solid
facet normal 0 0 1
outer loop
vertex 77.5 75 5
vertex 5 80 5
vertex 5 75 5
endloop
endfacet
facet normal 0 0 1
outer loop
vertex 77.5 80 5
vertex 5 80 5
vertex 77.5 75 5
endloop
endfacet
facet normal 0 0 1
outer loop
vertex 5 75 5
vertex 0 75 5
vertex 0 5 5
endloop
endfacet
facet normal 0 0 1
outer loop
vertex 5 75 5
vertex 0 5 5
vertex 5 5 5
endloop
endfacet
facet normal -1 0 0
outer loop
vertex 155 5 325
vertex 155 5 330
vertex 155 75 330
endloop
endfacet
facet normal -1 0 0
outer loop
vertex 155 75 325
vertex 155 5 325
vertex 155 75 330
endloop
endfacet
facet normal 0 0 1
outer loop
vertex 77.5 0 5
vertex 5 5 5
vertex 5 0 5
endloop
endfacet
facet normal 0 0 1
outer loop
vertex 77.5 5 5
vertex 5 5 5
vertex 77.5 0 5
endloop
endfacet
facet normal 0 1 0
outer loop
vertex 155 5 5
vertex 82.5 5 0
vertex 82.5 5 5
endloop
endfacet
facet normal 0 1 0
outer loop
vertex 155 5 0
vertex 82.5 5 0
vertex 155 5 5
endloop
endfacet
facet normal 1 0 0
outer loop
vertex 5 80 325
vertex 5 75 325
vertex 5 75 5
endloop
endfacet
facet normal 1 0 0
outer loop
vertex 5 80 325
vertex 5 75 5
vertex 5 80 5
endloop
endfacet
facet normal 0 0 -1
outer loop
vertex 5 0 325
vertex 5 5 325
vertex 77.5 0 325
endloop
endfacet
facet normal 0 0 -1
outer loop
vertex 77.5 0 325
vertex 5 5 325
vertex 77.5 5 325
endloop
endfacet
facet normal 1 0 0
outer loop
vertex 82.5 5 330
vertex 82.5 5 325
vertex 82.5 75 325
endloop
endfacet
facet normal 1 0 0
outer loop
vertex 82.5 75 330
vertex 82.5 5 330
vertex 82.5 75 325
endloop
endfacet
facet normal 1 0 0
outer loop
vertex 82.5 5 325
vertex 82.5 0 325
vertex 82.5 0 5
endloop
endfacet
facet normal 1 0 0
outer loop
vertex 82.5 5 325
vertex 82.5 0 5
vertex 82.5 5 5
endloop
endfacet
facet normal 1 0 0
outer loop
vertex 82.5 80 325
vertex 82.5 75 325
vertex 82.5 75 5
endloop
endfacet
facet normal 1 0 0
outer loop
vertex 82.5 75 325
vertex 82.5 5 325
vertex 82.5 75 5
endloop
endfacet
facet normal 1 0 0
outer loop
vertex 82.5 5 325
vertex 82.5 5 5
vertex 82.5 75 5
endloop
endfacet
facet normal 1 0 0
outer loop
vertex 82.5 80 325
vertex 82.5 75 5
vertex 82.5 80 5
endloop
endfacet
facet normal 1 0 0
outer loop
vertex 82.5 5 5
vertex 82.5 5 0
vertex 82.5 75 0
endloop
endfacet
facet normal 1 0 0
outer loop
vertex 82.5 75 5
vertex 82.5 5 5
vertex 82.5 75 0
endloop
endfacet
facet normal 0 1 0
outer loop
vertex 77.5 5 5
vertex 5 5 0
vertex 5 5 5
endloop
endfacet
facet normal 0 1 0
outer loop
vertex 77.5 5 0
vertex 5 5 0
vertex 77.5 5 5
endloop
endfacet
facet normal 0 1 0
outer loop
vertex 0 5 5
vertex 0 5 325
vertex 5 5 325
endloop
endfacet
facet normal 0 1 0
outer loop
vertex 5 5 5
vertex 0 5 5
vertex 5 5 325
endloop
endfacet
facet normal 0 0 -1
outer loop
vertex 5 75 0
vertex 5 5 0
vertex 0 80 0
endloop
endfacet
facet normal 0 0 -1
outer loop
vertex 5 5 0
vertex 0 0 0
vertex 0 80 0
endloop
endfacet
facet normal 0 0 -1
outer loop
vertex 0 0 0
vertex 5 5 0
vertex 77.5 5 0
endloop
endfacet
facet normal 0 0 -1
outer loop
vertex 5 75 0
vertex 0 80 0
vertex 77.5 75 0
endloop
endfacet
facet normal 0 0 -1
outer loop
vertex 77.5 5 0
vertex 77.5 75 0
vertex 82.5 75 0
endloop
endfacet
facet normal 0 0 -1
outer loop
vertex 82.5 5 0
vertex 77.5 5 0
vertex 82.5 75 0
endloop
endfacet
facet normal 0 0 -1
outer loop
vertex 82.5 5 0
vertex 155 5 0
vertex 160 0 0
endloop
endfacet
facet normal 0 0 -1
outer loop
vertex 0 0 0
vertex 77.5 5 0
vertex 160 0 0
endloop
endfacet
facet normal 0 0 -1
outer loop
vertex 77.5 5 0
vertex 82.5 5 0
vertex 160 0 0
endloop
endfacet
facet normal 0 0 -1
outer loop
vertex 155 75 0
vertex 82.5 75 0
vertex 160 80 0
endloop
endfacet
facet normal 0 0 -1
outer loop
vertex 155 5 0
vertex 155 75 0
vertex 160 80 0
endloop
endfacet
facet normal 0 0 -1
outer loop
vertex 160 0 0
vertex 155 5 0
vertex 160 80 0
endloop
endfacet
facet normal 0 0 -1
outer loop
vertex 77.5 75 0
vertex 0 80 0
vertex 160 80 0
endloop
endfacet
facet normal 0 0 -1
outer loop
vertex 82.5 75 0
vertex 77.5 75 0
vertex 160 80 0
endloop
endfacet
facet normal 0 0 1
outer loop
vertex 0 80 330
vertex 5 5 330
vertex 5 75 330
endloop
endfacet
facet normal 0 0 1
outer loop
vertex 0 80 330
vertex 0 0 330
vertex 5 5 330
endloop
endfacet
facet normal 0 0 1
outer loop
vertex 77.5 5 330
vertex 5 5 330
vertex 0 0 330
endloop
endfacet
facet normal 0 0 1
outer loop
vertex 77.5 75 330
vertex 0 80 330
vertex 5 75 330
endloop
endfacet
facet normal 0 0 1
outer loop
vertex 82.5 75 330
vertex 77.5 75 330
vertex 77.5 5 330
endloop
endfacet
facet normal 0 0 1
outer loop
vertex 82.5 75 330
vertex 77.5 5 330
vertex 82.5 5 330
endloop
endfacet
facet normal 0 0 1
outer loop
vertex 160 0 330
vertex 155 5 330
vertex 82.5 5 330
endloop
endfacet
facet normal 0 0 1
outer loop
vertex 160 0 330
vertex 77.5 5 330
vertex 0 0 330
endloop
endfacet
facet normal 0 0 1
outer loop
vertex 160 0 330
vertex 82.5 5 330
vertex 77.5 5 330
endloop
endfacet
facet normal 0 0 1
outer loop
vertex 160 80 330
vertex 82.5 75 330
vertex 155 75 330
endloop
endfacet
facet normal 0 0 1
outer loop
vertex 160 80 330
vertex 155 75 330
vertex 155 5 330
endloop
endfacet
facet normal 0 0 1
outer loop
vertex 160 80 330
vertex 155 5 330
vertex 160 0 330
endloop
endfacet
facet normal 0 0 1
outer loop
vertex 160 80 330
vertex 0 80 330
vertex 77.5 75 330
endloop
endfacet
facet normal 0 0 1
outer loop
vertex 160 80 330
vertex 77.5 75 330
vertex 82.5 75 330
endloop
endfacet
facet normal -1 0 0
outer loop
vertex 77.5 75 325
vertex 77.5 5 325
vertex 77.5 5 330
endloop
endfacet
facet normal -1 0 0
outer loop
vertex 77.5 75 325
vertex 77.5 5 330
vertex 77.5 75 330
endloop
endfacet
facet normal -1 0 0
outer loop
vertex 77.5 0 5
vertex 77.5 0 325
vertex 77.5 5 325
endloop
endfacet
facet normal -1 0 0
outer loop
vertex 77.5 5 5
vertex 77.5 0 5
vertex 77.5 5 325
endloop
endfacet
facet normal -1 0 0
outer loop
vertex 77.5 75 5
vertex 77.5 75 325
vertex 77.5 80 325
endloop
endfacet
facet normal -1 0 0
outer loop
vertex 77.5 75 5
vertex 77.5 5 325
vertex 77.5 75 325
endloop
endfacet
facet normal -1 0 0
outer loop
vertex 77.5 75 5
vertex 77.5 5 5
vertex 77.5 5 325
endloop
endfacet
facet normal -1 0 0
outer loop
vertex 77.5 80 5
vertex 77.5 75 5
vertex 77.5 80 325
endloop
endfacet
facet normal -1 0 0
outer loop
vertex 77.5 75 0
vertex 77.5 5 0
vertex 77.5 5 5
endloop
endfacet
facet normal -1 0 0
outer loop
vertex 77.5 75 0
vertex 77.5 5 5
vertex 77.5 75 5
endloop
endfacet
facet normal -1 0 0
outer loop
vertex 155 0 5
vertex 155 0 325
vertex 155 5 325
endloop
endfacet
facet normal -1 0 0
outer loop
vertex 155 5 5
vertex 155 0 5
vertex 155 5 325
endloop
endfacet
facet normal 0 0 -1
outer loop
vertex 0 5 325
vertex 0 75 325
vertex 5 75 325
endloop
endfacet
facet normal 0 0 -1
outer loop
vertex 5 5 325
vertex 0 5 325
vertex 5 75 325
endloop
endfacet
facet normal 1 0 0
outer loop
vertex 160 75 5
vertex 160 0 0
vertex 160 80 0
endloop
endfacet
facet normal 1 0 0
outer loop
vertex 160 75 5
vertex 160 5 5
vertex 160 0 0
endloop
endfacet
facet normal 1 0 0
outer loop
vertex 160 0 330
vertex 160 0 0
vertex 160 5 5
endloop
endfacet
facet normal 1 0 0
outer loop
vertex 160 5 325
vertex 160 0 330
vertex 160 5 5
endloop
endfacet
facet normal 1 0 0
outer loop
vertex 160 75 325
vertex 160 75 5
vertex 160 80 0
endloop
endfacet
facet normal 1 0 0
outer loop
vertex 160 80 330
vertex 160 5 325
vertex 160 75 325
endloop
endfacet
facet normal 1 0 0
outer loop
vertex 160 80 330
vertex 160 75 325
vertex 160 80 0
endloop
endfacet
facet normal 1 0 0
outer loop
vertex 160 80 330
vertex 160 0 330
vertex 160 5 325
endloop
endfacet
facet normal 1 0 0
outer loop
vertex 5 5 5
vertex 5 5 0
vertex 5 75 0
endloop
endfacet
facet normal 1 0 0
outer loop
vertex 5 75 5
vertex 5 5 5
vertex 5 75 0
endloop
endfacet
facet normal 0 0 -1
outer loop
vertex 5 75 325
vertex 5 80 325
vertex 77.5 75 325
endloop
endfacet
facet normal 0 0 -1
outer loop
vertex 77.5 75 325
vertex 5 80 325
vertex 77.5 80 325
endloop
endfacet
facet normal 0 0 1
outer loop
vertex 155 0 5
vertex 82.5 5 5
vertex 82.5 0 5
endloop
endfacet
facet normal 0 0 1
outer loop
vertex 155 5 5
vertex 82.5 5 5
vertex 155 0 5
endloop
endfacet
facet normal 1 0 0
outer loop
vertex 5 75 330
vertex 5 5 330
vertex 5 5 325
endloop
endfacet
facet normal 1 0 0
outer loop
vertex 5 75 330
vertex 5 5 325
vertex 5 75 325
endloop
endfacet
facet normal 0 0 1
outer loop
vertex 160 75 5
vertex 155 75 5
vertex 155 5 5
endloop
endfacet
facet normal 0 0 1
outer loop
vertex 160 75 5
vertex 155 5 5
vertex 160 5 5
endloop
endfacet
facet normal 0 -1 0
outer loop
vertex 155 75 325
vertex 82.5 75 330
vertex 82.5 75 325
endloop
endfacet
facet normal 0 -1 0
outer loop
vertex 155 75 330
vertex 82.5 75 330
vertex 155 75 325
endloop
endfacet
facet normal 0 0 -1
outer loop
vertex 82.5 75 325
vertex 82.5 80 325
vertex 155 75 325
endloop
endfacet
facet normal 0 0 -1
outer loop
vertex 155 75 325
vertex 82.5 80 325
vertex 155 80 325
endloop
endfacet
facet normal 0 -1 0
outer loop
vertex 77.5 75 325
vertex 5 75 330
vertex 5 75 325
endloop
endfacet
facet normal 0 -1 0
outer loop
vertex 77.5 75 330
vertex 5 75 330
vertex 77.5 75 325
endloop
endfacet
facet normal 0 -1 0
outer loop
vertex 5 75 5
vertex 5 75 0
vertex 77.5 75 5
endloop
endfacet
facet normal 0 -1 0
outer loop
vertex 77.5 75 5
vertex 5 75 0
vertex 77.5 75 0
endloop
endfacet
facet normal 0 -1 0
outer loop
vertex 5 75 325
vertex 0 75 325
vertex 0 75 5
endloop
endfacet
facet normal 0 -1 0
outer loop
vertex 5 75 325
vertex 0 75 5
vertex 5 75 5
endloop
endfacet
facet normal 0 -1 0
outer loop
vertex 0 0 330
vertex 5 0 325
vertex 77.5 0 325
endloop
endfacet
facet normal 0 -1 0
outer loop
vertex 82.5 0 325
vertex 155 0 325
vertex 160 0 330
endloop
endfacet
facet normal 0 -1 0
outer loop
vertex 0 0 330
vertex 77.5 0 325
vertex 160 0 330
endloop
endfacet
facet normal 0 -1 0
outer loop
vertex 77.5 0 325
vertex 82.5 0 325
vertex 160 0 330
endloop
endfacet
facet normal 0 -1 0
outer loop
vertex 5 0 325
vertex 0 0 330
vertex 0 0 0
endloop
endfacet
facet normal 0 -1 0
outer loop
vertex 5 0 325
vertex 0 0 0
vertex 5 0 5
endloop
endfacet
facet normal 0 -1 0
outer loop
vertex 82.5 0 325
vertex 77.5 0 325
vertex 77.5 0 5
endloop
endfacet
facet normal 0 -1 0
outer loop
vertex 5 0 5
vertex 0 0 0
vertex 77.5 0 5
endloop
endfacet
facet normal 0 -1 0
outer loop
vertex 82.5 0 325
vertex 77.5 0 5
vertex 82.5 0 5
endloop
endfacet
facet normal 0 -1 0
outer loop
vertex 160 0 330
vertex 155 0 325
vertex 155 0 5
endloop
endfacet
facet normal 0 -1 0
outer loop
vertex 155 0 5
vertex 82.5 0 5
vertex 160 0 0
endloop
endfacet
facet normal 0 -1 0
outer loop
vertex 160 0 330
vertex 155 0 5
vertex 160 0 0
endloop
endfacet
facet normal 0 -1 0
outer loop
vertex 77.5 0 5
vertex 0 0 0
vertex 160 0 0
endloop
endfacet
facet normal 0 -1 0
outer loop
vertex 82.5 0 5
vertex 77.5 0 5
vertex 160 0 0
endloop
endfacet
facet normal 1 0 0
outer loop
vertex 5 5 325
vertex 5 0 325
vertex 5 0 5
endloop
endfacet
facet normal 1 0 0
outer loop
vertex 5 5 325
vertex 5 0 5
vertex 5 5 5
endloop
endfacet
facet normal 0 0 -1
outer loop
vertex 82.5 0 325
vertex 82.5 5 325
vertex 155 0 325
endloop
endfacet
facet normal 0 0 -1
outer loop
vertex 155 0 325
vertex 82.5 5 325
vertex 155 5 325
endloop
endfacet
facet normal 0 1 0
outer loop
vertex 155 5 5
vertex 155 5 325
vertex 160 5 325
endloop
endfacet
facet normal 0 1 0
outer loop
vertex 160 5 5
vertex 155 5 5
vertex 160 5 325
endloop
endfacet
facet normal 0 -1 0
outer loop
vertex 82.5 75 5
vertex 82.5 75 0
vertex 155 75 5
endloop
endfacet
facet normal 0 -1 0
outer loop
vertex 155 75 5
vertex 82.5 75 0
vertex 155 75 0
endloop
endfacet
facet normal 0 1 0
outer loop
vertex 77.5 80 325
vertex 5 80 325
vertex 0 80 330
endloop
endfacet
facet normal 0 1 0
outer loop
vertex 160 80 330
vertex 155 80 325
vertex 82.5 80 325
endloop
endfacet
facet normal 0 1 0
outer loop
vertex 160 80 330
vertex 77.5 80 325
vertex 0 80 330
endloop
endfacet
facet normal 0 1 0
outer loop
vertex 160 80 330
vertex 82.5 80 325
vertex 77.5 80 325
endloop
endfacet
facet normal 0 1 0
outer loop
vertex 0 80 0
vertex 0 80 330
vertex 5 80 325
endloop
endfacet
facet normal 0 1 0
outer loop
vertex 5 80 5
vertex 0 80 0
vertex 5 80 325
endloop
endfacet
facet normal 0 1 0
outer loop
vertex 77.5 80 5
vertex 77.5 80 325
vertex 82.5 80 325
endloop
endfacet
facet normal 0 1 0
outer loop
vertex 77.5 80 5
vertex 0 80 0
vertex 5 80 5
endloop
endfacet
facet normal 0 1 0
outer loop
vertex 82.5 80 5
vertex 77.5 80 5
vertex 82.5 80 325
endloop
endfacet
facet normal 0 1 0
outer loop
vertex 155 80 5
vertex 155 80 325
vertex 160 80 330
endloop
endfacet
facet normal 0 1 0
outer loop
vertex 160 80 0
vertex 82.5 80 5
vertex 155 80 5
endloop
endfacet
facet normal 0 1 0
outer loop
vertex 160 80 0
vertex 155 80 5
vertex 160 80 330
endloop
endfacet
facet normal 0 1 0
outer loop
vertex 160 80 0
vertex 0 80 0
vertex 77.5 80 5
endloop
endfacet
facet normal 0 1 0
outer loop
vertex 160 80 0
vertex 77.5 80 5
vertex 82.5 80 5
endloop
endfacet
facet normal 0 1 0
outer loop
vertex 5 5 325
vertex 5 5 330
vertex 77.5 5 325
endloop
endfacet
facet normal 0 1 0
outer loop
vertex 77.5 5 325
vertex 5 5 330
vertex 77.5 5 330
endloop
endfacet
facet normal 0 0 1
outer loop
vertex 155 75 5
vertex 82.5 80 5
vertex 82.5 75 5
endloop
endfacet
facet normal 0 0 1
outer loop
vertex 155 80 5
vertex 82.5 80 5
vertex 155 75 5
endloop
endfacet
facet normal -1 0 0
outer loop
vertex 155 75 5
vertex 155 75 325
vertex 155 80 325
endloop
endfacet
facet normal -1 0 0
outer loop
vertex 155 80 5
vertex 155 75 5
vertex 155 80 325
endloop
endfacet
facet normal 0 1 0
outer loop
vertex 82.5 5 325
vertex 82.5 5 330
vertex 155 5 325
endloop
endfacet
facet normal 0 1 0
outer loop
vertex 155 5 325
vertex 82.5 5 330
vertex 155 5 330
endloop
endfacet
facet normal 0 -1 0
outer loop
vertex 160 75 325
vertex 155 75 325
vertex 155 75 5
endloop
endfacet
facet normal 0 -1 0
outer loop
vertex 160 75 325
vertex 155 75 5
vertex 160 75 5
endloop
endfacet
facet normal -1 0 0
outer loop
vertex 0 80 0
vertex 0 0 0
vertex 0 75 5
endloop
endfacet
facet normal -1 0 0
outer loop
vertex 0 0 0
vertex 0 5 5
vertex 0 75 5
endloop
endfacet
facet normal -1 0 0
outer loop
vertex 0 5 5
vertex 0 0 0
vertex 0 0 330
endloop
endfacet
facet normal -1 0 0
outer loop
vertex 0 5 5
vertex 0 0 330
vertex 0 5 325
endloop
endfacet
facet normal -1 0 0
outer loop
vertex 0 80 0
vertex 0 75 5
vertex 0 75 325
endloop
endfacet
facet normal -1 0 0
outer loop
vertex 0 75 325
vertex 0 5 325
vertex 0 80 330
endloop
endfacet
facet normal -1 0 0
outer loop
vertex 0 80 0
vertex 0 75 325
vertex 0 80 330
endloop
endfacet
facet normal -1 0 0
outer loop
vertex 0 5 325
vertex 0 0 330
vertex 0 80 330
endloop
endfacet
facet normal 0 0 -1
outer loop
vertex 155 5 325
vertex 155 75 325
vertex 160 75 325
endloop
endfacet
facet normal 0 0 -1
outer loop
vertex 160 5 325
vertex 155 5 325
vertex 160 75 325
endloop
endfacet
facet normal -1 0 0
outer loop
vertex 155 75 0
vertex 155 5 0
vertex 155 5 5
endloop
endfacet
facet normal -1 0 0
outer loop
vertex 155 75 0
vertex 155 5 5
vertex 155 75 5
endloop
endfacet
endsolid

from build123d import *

# Parameters (mm, degrees)
SKETCH3_W           = 160
SKETCH3_H           = 80
SKETCH3_W_2         = 150
SKETCH3_H_2         = 70
BOSS_EXTRUDE2_DEPTH = 5
SKETCH4_W           = 5
SKETCH4_H           = 5
BOSS_EXTRUDE3_DEPTH = 320
BOSS_EXTRUDE4_REACH = 327
SKETCH5_W           = 5
SKETCH5_H           = 80


with BuildPart() as part:
    # Sketch3 → Boss-Extrude2 (new body)
    with BuildSketch(Plane.XY):
        with Locations((80, 40)):
            Rectangle(SKETCH3_W, SKETCH3_H)
        with Locations((80, 40)):
            Rectangle(SKETCH3_W_2, SKETCH3_H_2, mode=Mode.SUBTRACT)
        Polygon((77.5, 75), (77.5, 41.649156988), (77.5, 5), (82.5, 5), (82.5, 41.649156988), (82.5, 75), align=None)
    boss_extrude2 = extrude(amount=BOSS_EXTRUDE2_DEPTH)

    # Sketch4 → Boss-Extrude3 (add)
    with BuildSketch(Plane.XY.offset(5)):
        with Locations((2.5, 2.5)):
            Rectangle(SKETCH4_W, SKETCH4_H)
        with Locations((2.5, 77.5)):
            Rectangle(SKETCH4_W, SKETCH4_H)
        with Locations((157.5, 77.5)):
            Rectangle(SKETCH4_W, SKETCH4_H)
        with Locations((157.5, 2.5)):
            Rectangle(SKETCH4_W, SKETCH4_H)
    extrude(amount=BOSS_EXTRUDE3_DEPTH)

    # Mirror1: Boss-Extrude2 across plane
    add(boss_extrude2.mirror(Plane.XY.offset(165)))

    # Sketch5 → Boss-Extrude4 (add, up to next)
    with BuildSketch(Plane.XY.offset(5), mode=Mode.PRIVATE) as boss_extrude4_sk1:
        with Locations((80, 40)):
            Rectangle(SKETCH5_W, SKETCH5_H)
    boss_extrude4_tool1 = extrude(boss_extrude4_sk1.sketch, amount=BOSS_EXTRUDE4_REACH, mode=Mode.PRIVATE) - part.part
    add(boss_extrude4_tool1.solids().sort_by_distance((80, 40, 5))[0])


solid = part.part
